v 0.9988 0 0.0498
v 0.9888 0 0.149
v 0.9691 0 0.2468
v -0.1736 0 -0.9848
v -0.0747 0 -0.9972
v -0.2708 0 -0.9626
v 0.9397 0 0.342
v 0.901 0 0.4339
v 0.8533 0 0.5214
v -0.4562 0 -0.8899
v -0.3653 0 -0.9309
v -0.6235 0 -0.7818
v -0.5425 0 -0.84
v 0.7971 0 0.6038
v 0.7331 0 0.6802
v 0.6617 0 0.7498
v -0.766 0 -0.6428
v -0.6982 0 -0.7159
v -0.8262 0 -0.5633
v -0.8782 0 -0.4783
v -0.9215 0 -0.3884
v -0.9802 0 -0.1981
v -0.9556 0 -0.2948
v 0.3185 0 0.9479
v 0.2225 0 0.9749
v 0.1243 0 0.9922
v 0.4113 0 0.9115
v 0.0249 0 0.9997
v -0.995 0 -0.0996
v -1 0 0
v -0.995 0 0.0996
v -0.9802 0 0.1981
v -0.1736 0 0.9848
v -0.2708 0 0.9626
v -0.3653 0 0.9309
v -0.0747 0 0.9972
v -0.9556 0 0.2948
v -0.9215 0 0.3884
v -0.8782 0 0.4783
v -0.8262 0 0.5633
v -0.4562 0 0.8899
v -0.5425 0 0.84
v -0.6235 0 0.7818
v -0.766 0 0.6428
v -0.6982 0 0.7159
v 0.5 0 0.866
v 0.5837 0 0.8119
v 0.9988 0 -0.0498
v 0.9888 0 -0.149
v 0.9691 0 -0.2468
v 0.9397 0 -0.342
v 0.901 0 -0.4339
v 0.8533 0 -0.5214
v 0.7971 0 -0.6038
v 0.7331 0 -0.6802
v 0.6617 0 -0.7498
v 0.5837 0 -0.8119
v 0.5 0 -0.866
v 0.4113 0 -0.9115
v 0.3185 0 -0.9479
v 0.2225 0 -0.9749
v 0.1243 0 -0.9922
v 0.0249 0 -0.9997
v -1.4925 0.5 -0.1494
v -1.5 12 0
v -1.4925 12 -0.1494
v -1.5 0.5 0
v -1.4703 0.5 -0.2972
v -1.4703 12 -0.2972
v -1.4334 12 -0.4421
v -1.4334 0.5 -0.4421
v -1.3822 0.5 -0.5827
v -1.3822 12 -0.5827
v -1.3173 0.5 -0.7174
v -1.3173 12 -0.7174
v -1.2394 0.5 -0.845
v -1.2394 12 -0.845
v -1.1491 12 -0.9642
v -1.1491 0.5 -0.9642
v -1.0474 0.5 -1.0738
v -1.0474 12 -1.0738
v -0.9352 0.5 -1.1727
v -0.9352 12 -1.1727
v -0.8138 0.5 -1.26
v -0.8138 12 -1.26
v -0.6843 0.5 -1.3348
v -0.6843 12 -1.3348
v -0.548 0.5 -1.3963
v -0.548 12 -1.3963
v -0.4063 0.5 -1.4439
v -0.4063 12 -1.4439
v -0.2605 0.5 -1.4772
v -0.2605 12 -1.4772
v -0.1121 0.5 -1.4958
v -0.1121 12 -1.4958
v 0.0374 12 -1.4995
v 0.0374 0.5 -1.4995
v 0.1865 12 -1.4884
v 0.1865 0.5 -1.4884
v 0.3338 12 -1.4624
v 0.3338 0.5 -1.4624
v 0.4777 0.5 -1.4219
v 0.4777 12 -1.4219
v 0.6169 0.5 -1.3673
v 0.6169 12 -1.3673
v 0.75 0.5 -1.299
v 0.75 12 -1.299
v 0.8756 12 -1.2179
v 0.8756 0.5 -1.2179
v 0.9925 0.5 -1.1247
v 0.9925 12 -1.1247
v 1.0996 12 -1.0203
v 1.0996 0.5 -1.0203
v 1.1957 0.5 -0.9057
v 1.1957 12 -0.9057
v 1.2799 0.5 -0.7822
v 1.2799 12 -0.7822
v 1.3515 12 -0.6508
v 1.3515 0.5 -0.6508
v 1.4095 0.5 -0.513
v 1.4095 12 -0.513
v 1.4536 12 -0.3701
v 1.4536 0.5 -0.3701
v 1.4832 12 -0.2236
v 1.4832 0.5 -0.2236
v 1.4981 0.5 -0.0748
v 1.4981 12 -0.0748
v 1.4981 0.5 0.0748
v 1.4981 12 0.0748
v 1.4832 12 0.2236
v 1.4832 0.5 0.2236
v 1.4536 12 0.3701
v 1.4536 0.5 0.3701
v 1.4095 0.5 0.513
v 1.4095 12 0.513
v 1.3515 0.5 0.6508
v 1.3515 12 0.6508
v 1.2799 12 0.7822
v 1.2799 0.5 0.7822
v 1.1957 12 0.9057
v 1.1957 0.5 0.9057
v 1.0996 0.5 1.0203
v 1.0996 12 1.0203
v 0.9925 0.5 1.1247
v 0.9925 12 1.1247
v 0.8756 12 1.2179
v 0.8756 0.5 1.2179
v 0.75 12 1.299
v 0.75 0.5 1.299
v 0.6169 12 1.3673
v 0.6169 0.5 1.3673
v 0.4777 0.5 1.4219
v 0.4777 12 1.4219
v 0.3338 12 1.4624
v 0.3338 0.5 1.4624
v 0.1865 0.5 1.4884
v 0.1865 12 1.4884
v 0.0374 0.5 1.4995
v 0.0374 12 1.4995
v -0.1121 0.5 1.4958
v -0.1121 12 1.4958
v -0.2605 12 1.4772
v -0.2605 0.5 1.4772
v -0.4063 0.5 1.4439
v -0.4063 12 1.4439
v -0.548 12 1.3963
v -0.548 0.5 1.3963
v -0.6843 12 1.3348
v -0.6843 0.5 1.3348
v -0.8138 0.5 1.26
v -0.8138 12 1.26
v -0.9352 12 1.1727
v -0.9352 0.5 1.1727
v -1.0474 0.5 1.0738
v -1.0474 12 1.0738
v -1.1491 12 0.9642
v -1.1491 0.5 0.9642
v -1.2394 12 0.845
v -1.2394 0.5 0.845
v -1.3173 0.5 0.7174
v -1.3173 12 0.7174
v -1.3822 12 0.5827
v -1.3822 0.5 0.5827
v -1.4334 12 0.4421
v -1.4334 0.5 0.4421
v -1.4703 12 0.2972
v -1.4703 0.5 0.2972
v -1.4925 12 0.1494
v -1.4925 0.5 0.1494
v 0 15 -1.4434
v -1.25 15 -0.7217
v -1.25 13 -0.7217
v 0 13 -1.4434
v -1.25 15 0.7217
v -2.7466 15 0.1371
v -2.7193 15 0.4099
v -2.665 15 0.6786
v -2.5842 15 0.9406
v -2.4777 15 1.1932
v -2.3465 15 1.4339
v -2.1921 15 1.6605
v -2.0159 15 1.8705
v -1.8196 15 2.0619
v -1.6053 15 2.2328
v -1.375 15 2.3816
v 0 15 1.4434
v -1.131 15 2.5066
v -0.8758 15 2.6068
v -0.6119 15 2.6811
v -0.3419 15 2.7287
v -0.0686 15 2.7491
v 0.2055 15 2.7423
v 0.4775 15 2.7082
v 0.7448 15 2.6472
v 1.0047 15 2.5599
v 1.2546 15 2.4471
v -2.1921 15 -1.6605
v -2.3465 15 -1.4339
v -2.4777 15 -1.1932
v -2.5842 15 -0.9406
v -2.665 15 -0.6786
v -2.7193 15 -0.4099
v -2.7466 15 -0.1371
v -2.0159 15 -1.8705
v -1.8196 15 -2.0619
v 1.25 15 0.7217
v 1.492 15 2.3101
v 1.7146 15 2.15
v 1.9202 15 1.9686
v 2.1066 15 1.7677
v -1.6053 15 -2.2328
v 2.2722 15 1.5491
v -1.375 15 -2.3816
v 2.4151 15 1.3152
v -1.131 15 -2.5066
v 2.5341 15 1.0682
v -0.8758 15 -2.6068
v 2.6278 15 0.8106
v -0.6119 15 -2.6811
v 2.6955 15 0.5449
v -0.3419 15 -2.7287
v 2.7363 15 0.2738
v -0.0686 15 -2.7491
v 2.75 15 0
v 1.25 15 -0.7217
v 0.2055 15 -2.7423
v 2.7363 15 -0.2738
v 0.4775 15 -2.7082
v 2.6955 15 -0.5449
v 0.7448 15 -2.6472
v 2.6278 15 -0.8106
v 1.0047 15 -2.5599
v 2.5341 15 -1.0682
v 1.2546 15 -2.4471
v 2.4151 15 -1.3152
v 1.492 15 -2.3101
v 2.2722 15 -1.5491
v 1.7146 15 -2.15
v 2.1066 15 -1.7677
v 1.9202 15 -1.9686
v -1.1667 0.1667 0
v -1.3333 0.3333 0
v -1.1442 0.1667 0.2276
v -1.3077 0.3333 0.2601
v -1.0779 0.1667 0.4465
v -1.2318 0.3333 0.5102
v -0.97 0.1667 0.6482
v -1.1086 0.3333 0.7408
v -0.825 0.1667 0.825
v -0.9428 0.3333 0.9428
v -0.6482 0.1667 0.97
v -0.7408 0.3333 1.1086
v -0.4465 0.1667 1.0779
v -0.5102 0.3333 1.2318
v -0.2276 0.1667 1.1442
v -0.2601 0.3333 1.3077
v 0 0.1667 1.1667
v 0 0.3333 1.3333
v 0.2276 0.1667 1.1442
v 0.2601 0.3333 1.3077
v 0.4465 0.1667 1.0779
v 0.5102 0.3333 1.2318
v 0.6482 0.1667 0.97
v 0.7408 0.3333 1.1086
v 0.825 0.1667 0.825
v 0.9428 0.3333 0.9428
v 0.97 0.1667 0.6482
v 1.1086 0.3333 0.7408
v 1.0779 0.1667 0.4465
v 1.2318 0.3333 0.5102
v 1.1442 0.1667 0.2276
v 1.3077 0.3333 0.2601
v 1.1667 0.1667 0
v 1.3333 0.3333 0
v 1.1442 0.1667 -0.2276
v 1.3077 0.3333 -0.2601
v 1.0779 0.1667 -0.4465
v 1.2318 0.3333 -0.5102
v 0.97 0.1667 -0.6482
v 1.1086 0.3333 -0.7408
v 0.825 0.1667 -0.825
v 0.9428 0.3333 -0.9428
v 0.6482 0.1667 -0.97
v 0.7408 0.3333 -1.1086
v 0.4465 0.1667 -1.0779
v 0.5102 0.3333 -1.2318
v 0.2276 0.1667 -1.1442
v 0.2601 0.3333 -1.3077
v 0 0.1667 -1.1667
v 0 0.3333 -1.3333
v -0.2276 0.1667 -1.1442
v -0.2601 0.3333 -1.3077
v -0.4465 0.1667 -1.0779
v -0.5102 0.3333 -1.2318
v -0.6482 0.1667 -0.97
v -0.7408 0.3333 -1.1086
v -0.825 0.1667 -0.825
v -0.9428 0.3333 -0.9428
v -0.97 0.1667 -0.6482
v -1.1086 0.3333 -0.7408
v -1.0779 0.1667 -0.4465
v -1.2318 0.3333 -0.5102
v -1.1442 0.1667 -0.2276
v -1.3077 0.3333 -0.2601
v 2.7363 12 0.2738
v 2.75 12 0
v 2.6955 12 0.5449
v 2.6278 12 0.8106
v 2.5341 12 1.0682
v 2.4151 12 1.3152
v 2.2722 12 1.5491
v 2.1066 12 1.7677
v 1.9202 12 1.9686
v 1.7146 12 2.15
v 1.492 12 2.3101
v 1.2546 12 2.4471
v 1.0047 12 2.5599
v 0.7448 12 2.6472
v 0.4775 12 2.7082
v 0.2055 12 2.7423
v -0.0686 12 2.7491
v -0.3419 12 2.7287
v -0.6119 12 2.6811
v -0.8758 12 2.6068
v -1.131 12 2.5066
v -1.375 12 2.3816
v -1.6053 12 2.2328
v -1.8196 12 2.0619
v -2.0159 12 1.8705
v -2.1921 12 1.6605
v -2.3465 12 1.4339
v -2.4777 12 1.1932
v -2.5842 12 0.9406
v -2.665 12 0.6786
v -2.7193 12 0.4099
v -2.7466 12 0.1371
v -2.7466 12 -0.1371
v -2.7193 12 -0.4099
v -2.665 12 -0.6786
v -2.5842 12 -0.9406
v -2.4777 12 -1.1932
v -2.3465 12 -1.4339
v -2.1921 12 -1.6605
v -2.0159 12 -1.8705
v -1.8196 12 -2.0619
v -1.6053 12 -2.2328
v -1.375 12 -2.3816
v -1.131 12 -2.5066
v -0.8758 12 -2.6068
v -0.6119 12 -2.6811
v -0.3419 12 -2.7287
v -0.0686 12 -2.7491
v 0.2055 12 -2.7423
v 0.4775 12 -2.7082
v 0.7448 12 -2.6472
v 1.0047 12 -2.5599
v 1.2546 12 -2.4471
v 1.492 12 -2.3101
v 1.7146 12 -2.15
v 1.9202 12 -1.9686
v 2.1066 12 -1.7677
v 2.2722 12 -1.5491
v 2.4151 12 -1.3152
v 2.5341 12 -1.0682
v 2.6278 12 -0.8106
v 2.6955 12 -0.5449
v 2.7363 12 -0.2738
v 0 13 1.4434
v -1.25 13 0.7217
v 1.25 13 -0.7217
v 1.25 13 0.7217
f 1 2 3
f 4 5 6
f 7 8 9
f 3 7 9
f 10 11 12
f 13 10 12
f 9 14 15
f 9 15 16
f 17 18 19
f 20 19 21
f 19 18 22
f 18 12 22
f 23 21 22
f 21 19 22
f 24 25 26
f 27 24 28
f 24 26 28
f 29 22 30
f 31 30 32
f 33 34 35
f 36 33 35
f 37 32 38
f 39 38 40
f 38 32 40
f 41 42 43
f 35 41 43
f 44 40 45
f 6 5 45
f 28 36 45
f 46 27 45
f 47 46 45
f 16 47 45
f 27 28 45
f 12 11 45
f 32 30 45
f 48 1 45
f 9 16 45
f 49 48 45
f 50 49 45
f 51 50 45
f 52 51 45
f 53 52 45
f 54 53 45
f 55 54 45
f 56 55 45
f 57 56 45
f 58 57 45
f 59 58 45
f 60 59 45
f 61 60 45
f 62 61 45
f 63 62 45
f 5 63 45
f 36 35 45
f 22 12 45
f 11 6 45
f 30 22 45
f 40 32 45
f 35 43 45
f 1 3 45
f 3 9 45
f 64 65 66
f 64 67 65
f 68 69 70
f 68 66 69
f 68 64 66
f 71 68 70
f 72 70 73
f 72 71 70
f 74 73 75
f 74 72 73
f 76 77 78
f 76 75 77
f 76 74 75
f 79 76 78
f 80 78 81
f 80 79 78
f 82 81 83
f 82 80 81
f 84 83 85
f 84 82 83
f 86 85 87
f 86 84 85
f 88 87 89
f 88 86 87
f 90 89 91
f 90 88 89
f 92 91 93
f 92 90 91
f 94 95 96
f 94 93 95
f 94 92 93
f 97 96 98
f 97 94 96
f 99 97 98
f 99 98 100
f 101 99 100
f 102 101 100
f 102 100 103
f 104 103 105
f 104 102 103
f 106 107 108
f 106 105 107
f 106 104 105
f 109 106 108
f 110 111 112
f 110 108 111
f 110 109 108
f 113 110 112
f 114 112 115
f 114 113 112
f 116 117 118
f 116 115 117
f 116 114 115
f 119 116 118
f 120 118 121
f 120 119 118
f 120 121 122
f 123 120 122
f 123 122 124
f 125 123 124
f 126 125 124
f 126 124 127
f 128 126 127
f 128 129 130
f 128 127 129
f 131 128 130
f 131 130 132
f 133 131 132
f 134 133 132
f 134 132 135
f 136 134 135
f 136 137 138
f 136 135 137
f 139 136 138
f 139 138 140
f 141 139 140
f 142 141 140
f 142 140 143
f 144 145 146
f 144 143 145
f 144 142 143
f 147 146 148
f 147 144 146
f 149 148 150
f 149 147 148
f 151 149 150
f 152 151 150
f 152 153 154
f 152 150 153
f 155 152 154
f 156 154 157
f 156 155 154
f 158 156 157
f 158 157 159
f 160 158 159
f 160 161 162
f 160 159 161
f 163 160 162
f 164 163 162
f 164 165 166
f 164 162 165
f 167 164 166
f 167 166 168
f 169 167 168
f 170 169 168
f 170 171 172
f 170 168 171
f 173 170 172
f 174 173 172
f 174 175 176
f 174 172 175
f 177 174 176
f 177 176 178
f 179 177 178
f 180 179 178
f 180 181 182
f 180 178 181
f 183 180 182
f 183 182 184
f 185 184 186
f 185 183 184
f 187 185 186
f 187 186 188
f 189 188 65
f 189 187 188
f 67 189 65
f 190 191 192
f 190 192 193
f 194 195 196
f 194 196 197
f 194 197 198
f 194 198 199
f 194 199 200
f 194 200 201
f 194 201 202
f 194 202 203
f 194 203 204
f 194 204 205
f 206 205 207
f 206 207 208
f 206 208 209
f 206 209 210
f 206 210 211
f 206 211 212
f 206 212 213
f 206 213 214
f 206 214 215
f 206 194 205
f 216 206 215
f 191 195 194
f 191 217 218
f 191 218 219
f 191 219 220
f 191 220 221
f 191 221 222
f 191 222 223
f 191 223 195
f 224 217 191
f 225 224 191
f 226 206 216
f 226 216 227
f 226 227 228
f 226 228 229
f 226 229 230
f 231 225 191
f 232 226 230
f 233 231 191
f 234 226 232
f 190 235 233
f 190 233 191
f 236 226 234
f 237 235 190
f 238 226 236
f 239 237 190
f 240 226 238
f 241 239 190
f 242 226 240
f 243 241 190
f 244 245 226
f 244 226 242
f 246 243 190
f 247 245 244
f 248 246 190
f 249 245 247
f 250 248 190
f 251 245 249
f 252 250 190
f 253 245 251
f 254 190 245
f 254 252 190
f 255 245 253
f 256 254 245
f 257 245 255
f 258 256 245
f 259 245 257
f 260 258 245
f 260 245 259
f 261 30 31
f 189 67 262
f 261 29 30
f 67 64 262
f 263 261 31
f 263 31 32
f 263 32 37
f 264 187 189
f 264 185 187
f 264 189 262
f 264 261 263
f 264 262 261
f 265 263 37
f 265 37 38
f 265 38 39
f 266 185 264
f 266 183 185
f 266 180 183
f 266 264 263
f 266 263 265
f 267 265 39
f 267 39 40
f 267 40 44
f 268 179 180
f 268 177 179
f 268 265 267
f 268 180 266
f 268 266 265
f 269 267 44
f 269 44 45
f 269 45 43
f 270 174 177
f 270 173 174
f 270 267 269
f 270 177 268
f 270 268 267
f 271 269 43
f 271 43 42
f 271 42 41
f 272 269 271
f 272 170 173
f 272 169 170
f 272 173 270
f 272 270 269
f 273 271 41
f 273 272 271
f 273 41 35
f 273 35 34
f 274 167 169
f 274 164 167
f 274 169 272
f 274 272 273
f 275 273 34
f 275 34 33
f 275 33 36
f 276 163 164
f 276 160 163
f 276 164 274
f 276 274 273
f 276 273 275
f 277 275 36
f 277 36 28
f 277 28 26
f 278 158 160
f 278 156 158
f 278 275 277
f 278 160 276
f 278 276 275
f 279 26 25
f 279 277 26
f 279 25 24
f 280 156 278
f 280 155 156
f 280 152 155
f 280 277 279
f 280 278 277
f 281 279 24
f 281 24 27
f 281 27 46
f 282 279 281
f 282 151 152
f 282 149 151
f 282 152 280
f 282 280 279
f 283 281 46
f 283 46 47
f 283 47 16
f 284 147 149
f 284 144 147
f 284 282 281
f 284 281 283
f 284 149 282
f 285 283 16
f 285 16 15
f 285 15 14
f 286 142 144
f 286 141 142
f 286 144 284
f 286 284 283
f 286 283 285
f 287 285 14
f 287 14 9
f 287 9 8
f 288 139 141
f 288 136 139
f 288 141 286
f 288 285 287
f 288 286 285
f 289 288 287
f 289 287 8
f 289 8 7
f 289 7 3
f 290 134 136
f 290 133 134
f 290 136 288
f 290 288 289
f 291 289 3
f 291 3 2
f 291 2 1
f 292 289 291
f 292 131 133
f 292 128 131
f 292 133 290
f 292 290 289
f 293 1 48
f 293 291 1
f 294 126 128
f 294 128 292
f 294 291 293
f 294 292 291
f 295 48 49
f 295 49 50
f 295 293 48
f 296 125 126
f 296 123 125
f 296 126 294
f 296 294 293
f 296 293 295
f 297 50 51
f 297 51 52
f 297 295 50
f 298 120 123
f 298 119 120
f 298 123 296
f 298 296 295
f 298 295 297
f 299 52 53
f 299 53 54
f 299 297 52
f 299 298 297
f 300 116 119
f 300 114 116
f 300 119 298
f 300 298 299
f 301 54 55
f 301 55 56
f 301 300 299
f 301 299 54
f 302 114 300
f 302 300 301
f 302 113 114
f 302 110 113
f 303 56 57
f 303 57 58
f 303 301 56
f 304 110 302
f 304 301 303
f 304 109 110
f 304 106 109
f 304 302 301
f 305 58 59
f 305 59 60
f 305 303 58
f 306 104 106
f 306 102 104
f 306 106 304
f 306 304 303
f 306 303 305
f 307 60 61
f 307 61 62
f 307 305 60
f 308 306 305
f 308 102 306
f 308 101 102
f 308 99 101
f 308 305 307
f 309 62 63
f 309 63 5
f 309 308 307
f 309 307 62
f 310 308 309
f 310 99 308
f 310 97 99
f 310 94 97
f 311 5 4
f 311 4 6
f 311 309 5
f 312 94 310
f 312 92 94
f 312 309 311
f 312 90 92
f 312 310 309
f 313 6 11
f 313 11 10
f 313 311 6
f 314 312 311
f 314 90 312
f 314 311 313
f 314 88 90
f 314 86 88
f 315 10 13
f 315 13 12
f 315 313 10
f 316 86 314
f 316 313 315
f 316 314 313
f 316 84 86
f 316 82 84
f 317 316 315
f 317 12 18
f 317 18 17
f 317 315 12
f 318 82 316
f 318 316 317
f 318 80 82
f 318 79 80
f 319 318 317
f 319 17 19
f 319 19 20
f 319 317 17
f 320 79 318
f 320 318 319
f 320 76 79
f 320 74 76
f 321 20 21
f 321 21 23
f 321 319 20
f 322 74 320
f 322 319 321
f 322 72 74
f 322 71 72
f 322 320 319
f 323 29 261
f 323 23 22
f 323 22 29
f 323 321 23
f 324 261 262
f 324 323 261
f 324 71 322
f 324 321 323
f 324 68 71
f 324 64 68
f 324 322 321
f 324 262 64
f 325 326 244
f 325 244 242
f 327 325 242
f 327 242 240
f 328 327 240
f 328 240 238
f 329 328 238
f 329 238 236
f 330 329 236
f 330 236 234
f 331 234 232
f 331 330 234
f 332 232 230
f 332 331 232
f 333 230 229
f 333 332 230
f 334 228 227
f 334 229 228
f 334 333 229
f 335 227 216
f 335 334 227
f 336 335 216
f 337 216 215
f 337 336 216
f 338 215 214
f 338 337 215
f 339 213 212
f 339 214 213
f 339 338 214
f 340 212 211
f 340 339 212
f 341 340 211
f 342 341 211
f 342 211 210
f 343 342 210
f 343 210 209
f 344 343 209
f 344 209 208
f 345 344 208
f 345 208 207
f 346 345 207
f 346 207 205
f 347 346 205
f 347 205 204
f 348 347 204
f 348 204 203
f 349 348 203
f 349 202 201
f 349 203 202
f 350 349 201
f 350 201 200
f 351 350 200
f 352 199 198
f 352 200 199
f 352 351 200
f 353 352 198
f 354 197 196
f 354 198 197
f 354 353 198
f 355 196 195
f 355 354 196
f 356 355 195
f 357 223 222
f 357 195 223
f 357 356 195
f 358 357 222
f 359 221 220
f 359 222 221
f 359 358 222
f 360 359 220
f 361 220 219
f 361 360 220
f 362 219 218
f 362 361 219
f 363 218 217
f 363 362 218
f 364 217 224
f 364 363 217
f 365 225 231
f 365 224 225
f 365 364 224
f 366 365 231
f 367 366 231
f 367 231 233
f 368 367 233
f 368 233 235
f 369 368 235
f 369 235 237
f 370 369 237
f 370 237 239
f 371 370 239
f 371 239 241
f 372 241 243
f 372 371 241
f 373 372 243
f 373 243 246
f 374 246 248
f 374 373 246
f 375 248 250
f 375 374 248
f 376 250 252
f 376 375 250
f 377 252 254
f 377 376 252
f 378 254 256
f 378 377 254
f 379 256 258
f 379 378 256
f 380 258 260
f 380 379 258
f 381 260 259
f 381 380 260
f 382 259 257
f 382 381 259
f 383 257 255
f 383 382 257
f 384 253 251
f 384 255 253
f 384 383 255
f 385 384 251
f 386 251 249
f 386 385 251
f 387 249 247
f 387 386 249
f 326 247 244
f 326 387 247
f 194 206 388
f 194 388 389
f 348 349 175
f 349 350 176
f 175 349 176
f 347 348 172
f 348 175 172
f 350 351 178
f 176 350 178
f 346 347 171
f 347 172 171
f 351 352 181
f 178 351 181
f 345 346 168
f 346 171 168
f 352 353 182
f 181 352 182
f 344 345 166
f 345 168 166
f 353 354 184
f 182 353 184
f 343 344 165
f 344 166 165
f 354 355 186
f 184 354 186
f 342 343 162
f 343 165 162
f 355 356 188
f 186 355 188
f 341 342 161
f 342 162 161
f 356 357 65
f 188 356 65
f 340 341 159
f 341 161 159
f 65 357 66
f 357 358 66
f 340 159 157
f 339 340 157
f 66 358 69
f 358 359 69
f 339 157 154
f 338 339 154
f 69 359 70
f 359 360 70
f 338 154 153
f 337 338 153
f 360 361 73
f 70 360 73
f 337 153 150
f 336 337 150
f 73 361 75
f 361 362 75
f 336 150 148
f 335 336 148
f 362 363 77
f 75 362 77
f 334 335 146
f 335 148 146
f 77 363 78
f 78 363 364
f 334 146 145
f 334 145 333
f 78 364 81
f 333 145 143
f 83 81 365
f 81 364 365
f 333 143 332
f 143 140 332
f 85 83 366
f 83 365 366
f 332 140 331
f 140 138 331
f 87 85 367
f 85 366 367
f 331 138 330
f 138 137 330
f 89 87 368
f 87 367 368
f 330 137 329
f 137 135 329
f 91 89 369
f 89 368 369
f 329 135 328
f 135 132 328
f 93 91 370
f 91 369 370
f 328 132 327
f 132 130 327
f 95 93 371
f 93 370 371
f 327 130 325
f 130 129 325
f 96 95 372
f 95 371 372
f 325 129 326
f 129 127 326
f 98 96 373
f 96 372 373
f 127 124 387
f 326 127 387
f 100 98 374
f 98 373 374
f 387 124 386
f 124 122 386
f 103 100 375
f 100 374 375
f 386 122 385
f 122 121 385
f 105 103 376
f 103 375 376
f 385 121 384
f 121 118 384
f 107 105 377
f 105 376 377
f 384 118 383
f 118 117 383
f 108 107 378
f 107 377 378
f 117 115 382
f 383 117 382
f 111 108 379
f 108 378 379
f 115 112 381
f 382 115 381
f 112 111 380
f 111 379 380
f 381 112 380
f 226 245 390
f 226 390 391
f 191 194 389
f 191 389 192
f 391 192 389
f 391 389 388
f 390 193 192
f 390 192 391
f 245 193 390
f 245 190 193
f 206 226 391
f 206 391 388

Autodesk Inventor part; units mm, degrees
ref_plane "YZ Plane" through (0, 0, 0) normal (1, 0, 0) x (0, 1, 0)
ref_plane "XZ Plane" through (0, 0, 0) normal (0, 1, 0) x (-1, 0, 0)
ref_plane "XY Plane" through (0, 0, 0) normal (0, 0, 1) x (1, 0, 0)
sketch "Sketch1" plane through (0, 0, 0) normal (0, 1, 0) x (-1, 0, 0)
  circle A0 centre (0, 0) radius 1.5
  dimension "d0" = 3
extrude "Extrusion1" add sketch "Sketch1" along normal blind 12
sketch "Sketch2" plane through (0, 12, 0) normal (0, 1, 0) x (1, 0, 0)
  circle A0 centre (0, 0) radius 1.5 projected
  circle A1 centre (0, 0) radius 2.75
  dimension "d3" = 5.5
extrude "Extrusion2" add sketch "Sketch2" along normal blind 3 contours A0 | A1
sketch "Sketch3" plane through (0, 15, 0) normal (0, 1, 0) x (1, 0, 0)
  circle A0 centre (0, 0) radius 2.75 projected
  line L0 (0, 1.4434) -> (1.25, 0.7217)
  line L1 (1.25, 0.7217) -> (1.25, -0.7217)
  line L2 (1.25, -0.7217) -> (0, -1.4434)
  line L3 (0, -1.4434) -> (-1.25, -0.7217)
  line L4 (-1.25, -0.7217) -> (-1.25, 0.7217)
  line L5 (-1.25, 0.7217) -> (0, 1.4434)
  dimension "d6" = 2.5
extrude "Extrusion3" cut sketch "Sketch3" against normal blind 2 contours L0 L1 L2 L3 L4 L5
thread "Thread1" size "M3x0.5" class "6g" standard "ANSI Metric M Profile" full length
chamfer "Chamfer1" distance 0.5 angle 45 1 edges at (1.5, 0, 0)
properties part number "M3x12SHCS"
